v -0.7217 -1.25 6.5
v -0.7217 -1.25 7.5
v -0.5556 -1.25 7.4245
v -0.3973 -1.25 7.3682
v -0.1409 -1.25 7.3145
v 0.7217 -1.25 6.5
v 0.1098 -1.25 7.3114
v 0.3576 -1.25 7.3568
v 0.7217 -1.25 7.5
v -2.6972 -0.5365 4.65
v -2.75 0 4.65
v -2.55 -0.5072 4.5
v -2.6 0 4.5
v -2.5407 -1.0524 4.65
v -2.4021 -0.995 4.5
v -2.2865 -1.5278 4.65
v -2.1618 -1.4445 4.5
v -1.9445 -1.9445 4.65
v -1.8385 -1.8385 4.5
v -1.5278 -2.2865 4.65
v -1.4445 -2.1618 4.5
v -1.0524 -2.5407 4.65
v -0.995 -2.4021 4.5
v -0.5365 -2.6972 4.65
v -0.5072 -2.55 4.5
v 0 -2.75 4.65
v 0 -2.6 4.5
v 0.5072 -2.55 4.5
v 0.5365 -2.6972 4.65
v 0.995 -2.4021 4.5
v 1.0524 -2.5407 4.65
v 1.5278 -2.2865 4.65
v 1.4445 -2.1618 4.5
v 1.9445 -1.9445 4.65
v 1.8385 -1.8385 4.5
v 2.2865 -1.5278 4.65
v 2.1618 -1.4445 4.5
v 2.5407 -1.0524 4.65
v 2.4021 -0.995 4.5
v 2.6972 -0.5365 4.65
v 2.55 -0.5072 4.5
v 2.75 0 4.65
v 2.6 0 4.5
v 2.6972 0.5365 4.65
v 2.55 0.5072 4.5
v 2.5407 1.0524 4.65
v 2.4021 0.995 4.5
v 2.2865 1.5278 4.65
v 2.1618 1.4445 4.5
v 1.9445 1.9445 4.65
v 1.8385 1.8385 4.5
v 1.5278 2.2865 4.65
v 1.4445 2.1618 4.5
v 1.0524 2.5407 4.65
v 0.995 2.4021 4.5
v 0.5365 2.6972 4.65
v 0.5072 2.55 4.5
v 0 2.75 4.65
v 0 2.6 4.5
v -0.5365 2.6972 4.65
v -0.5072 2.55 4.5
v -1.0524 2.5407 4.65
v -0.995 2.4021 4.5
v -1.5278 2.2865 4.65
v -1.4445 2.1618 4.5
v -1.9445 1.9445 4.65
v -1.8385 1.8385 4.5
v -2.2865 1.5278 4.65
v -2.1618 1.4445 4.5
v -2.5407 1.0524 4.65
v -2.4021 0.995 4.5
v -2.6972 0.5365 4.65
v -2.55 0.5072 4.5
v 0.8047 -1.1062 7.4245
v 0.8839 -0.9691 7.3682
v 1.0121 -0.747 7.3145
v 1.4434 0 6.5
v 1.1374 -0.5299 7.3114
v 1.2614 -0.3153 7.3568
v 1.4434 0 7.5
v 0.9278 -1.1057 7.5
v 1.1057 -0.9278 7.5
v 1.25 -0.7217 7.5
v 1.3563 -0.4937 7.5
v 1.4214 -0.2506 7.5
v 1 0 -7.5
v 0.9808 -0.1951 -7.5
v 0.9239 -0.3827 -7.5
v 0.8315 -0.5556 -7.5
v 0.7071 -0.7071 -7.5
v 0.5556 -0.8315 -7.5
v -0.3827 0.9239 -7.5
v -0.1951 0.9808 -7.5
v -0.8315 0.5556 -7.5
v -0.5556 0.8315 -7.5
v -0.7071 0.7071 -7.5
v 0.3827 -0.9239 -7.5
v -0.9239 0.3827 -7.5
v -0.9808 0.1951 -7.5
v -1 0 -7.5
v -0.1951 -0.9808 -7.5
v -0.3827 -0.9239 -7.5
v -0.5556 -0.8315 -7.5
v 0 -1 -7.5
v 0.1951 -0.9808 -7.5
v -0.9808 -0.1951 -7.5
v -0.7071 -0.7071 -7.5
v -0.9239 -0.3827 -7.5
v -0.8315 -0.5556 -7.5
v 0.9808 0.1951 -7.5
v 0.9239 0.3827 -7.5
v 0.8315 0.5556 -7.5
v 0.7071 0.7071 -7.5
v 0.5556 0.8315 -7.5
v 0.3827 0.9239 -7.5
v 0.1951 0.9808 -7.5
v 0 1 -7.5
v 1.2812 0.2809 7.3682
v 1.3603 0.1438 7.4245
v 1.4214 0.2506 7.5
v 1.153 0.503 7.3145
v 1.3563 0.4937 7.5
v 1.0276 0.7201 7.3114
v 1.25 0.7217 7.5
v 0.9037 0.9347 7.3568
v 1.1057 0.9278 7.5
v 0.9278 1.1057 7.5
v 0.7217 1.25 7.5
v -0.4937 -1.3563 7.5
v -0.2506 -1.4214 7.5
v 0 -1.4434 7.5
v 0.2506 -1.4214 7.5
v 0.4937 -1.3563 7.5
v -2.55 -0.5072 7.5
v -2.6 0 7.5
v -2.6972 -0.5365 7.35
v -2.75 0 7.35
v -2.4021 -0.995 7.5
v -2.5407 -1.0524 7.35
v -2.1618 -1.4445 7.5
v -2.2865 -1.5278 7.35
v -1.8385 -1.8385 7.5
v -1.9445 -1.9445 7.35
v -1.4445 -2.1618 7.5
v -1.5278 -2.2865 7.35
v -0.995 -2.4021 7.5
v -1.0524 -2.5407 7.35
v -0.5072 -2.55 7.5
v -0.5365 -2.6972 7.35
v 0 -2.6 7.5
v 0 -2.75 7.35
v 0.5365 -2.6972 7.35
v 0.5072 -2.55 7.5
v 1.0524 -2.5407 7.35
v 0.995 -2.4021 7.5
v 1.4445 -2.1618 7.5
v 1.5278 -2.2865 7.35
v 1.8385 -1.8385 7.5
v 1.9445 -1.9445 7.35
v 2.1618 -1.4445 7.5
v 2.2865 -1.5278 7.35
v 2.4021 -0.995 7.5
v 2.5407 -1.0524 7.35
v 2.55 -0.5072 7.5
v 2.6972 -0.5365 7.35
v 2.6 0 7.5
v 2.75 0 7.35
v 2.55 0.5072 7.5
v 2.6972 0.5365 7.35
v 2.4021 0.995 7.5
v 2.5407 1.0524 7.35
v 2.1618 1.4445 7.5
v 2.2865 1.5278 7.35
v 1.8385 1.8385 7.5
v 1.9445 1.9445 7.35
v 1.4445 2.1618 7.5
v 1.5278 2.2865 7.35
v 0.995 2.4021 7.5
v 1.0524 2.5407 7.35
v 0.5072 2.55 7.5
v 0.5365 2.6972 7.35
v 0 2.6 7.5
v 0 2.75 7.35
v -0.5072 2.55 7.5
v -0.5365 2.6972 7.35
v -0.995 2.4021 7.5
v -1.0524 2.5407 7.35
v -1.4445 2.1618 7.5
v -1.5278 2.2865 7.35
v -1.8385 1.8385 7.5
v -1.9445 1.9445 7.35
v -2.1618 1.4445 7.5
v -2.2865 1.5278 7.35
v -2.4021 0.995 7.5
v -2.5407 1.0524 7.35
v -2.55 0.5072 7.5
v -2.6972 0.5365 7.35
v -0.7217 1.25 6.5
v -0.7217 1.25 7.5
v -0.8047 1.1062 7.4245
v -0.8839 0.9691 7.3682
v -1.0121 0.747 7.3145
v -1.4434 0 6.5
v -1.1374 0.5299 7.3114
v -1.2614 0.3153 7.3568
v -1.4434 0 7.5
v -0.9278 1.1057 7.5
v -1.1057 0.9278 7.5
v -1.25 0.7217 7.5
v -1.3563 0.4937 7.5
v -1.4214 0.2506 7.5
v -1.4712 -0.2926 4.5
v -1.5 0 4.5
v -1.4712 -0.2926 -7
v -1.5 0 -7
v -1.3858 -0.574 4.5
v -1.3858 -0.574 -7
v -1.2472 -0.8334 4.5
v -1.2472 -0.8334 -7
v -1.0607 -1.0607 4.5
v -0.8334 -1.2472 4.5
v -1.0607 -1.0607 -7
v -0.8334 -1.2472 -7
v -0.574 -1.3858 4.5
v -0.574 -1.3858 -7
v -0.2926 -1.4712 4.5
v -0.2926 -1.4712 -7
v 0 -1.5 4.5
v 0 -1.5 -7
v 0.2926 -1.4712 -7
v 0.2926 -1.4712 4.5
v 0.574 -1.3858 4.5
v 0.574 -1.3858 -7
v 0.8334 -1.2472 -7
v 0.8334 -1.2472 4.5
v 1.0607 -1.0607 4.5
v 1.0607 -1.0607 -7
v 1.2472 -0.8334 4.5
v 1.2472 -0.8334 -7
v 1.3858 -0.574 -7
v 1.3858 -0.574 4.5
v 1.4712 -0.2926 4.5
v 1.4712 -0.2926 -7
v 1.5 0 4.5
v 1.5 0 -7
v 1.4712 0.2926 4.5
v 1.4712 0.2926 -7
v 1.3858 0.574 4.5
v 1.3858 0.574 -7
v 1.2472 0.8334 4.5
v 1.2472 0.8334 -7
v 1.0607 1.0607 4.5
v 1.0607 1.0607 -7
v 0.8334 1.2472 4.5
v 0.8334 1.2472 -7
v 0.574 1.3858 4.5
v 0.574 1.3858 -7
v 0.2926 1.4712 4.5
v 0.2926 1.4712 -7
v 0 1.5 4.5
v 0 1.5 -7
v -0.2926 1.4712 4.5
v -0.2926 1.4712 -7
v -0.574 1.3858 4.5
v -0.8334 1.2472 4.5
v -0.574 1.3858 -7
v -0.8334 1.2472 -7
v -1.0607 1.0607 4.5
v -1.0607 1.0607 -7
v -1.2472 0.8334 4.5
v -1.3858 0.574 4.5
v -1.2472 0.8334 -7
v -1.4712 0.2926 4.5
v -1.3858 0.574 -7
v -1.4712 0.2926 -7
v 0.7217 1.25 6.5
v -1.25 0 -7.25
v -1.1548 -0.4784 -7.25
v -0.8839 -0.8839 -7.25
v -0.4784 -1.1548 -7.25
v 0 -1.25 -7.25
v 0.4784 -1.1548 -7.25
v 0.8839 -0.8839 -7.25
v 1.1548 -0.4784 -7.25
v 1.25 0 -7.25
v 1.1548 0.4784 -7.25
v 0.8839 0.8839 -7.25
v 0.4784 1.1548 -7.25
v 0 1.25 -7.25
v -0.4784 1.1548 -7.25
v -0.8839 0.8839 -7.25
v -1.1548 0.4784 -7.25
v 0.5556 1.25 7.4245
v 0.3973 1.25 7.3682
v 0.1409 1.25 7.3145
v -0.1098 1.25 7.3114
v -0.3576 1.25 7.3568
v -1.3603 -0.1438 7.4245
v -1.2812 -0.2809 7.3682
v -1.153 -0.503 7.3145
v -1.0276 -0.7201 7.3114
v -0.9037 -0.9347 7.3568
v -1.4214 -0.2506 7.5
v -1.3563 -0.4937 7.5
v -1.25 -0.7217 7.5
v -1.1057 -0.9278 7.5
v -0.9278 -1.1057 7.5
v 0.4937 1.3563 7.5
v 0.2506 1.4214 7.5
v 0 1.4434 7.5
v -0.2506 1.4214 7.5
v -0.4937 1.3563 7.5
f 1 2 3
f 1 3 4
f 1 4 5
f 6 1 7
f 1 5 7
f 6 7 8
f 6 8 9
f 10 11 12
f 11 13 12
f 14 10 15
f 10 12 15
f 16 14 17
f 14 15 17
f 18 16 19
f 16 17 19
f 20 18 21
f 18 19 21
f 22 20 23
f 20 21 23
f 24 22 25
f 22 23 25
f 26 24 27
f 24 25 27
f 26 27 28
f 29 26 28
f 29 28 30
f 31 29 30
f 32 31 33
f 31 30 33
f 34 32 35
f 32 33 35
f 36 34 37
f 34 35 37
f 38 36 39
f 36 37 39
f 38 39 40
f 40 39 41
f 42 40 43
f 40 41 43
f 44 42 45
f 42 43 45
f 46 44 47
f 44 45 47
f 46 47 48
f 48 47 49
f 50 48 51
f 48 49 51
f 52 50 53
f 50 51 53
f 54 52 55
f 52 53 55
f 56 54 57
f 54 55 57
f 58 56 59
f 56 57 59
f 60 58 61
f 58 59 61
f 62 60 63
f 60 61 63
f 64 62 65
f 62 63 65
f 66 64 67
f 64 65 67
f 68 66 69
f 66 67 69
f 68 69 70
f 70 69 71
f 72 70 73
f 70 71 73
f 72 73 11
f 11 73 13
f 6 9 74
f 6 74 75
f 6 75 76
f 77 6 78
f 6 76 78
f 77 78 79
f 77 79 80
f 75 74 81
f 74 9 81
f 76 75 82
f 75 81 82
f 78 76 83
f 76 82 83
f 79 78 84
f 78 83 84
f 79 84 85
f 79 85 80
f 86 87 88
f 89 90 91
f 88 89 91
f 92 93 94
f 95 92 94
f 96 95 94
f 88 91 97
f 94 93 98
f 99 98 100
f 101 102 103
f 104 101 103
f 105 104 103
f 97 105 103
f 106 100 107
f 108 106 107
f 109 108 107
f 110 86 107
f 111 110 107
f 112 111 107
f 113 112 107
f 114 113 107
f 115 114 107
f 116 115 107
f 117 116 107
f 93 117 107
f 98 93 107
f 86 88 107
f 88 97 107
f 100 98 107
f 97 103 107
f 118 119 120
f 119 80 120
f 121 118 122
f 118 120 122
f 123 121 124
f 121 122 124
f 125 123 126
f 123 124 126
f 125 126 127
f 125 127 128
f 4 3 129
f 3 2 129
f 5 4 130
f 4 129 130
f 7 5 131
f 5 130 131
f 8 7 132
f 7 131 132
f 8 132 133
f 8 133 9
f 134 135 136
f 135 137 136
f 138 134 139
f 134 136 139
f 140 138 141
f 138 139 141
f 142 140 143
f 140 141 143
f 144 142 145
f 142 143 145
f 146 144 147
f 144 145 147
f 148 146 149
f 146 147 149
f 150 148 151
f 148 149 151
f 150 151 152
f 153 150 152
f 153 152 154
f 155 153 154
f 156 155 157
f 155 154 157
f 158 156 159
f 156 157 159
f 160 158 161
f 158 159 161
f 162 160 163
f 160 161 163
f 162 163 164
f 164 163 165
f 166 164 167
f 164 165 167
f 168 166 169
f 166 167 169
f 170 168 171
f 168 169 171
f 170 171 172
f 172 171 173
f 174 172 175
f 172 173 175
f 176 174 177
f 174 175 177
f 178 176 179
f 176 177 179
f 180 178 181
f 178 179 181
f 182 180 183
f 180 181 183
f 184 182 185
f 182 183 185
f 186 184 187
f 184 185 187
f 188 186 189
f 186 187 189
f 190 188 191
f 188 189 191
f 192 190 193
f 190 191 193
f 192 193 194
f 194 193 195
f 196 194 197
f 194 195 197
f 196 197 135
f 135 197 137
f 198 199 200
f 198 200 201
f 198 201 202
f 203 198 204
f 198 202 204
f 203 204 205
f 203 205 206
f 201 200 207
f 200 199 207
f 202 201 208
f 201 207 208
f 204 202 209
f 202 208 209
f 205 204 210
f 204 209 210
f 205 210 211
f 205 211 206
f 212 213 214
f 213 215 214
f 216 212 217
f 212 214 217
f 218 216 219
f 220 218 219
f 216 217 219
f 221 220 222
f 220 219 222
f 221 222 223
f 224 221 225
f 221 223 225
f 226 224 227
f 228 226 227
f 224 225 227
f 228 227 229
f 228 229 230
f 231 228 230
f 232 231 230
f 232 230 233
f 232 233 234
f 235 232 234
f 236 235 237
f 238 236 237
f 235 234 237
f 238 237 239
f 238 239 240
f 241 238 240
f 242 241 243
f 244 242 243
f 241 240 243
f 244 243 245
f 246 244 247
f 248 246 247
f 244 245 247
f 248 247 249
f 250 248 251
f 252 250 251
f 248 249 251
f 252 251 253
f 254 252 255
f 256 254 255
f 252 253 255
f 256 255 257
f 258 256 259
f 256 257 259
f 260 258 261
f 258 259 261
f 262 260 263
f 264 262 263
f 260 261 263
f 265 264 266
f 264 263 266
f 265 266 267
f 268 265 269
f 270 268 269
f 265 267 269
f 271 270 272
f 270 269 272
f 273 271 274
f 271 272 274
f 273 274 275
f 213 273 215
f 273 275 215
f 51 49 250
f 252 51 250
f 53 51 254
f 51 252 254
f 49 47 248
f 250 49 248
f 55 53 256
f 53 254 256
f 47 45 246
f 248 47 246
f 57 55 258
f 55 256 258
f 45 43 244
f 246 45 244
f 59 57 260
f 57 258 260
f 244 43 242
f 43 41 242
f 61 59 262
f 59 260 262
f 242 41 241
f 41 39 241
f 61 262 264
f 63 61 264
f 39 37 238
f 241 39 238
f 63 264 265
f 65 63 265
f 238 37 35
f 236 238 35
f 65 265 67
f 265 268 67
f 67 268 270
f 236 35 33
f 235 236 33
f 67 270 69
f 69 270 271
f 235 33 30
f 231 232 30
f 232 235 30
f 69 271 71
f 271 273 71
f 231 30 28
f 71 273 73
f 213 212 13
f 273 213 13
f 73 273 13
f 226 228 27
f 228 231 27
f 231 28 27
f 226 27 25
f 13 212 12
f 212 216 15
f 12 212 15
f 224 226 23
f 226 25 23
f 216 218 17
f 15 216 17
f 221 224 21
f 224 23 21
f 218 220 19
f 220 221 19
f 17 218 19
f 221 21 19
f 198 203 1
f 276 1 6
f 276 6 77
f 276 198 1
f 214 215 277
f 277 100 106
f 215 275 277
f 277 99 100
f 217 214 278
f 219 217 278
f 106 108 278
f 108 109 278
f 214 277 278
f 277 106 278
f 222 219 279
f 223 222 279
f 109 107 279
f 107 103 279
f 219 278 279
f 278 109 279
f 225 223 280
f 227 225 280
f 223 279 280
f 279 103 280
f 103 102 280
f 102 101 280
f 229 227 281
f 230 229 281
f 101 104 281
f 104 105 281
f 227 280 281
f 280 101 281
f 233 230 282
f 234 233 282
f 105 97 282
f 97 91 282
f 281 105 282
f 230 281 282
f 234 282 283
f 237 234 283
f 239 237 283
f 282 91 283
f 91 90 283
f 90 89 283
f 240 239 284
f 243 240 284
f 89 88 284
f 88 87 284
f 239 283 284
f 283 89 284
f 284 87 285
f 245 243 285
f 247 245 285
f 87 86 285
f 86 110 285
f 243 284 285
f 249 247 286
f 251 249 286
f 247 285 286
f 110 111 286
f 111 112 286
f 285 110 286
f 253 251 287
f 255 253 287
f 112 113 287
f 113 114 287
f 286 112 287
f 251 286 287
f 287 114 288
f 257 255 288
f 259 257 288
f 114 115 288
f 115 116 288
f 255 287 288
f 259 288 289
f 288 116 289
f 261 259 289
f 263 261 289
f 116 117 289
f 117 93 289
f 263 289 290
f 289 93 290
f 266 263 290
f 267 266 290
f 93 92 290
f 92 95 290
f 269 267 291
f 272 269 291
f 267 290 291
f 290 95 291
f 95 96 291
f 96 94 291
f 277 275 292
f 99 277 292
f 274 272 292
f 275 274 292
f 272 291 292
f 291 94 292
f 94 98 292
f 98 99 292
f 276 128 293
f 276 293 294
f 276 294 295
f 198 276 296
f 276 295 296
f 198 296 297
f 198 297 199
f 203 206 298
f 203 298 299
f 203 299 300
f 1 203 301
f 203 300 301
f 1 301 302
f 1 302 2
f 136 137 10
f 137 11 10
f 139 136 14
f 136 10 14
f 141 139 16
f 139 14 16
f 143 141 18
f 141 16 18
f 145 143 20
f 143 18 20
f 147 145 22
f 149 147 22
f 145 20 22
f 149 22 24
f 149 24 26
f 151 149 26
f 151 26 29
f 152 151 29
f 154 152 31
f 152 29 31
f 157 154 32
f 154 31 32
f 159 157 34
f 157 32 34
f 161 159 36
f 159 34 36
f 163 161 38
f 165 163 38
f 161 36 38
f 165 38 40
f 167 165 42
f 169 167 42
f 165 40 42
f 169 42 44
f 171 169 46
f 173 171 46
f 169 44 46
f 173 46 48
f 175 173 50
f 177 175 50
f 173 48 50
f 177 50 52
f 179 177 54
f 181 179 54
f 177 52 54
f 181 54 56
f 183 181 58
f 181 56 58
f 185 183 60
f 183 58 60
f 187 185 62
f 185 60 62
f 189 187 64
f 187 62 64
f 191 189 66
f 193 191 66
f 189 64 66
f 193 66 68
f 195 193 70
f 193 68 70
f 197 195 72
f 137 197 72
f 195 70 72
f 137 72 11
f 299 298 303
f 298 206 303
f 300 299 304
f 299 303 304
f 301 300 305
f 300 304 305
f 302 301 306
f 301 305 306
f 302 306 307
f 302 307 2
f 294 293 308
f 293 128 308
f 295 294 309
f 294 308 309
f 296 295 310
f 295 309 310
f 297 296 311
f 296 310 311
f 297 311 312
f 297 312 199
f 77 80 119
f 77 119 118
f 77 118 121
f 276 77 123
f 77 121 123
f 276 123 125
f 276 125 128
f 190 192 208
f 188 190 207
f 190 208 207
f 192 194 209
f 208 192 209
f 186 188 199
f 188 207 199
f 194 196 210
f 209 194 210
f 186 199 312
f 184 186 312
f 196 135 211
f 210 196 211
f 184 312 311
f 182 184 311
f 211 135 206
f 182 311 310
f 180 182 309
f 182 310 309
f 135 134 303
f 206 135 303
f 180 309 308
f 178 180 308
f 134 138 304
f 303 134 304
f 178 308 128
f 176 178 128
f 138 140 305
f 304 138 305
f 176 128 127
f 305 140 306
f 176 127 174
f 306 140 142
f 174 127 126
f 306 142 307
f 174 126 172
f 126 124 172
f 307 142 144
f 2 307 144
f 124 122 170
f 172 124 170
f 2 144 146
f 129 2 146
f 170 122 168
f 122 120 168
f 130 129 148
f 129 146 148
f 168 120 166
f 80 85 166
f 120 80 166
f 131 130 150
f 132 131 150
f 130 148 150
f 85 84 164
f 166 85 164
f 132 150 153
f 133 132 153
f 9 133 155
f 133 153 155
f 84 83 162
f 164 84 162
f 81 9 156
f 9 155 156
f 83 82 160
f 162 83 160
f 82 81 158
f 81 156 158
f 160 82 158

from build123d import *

# Parameters (mm, degrees)
CUT_EXTRUDE1_DEPTH = 1
SKETCH4_R          = 1.443375673
CUT_EXTRUDE2_DEPTH = 0.5
CUT_EXTRUDE2_DRAFT = -45


with BuildPart() as part:
    # Sketch2 → Revolve1 (revolve)
    with BuildSketch(Plane(origin=(0, 0, 0), x_dir=(0, 0, -1), z_dir=(1, 0, 0)), mode=Mode.PRIVATE) as revolve1_sk:
        Polygon((-7.35, 2.75), (-4.65, 2.75), (-4.5, 2.6), (-4.5, 1.5), (7, 1.5), (7.5, 1), (7.5, 0), (-7.5, 0), (-7.5, 2.6), align=None)
    revolve(revolve1_sk.sketch.rotate(Axis((0, 0, -7.5), (0, 0, 1)), 90), axis=Axis((0, 0, -7.5), (0, 0, 1)))

    # Sketch3 → Cut-Extrude1 (cut)
    with BuildSketch(Plane.XY.offset(7.5)):
        Polygon((0.721687836, 1.25), (-0.721687836, 1.25), (-1.443375673, 0), (-0.721687836, -1.25), (0.721687836, -1.25), (1.443375673, 0), align=None)
    extrude(amount=-CUT_EXTRUDE1_DEPTH, mode=Mode.SUBTRACT)


with BuildPart() as cut_extrude2_tool:
    # Sketch4 → Cut-Extrude2 (with draft: the straight prism first)
    with BuildSketch(Plane.XY.offset(7.5)):
        Circle(SKETCH4_R)
    extrude(amount=-CUT_EXTRUDE2_DEPTH)
    # Cut-Extrude2: the draft: its side faces are tilted about the plane it starts from
    cut_extrude2_sides = [cut_extrude2_tool.faces().sort_by_distance(p)[0] for p in [
        (-1.443375673, 0, 7.25),
    ]]
    draft(cut_extrude2_sides, Plane.XY.offset(7.5), CUT_EXTRUDE2_DRAFT)


with BuildPart() as part_1:
    add(part.part)

    # Cut-Extrude2: cut by cut_extrude2_tool
    add(cut_extrude2_tool.part, mode=Mode.SUBTRACT)


solid = part_1.part
